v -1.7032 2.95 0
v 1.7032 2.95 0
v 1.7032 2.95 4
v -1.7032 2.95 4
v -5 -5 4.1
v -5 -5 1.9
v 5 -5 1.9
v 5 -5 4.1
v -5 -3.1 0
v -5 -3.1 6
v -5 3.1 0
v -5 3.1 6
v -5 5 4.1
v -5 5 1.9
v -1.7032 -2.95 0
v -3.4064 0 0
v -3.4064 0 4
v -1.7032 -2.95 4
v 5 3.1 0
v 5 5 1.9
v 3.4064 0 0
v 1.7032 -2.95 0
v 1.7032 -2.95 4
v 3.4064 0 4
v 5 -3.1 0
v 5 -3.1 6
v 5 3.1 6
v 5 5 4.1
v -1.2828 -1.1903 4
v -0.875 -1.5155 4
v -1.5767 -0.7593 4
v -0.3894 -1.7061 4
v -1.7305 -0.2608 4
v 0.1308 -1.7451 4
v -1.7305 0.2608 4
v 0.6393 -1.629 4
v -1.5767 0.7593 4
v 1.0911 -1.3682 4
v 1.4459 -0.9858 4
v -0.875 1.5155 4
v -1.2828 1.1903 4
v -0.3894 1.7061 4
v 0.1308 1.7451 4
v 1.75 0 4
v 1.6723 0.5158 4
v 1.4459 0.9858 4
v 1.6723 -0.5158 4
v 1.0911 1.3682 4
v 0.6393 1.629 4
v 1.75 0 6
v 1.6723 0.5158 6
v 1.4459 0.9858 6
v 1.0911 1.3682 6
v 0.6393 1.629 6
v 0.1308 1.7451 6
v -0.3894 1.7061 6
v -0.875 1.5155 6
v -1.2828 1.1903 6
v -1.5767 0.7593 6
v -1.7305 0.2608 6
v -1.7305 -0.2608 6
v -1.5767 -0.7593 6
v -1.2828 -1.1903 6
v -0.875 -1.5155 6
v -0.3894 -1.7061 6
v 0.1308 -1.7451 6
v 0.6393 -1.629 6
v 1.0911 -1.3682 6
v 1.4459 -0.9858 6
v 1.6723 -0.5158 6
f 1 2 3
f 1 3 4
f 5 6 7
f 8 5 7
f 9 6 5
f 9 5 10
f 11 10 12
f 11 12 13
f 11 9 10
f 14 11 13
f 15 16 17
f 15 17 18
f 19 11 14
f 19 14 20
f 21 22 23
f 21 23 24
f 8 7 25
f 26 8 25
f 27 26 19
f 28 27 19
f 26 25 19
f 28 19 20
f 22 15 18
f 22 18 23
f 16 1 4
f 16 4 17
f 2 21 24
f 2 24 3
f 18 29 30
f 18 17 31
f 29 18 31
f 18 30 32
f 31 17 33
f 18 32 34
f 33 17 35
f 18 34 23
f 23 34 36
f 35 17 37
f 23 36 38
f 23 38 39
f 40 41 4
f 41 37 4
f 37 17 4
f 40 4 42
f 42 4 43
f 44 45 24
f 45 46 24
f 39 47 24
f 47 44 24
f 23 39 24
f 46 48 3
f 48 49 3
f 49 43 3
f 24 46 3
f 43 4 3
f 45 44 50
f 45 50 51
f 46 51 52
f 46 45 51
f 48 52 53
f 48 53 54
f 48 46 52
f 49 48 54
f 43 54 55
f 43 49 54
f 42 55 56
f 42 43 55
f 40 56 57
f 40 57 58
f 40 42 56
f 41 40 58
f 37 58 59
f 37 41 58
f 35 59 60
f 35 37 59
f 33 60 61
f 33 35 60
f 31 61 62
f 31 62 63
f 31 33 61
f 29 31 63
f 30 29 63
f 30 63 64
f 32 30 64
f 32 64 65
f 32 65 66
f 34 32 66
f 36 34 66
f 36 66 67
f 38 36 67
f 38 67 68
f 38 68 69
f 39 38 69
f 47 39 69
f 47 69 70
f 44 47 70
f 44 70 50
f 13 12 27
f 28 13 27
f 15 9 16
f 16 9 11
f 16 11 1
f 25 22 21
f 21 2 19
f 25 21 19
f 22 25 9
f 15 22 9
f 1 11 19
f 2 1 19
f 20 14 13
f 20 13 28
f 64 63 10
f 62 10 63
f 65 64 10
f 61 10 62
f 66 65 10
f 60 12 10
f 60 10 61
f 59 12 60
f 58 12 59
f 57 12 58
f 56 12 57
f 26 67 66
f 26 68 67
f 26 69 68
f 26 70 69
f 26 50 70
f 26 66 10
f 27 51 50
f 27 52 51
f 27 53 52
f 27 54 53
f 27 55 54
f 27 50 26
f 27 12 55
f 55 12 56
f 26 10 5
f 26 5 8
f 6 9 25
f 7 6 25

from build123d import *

# Parameters (mm, degrees)
F0_W     = 10
F0_H     = 10
F0_R     = 1.75
F1_DEPTH = 6
F2_DEPTH = 4
F3_SIZE  = 1.9


with BuildPart() as f1:
    # F0 (on Top) → F1 (new body)
    with BuildSketch(Plane.XY):
        Rectangle(F0_W, F0_H)
        Polygon((-3.406367, 0), (-1.703183, 2.95), (1.703183, 2.95), (3.406367, 0), (1.703183, -2.95), (-1.703183, -2.95), align=None, mode=Mode.SUBTRACT)
        Polygon((1.703183, 2.95), (-1.703183, 2.95), (-3.406367, 0), (-1.703183, -2.95), (1.703183, -2.95), (3.406367, 0), align=None)
        Circle(F0_R, mode=Mode.SUBTRACT)
    extrude(amount=F1_DEPTH)

    # F0 (on Top) → F2 (cut)
    with BuildSketch(Plane.XY):
        Polygon((1.703183, 2.95), (-1.703183, 2.95), (-3.406367, 0), (-1.703183, -2.95), (1.703183, -2.95), (3.406367, 0), align=None)
        Circle(F0_R, mode=Mode.SUBTRACT)
    extrude(amount=F2_DEPTH, mode=Mode.SUBTRACT)

    # F3
    f3_edges = [f1.edges().sort_by_distance(p)[0] for p in [
        (0, 5, 0),
        (0, -5, 0),
        (0, 5, 6),
        (0, -5, 6),
    ]]
    chamfer(f3_edges, length=F3_SIZE)


solid = f1.part
